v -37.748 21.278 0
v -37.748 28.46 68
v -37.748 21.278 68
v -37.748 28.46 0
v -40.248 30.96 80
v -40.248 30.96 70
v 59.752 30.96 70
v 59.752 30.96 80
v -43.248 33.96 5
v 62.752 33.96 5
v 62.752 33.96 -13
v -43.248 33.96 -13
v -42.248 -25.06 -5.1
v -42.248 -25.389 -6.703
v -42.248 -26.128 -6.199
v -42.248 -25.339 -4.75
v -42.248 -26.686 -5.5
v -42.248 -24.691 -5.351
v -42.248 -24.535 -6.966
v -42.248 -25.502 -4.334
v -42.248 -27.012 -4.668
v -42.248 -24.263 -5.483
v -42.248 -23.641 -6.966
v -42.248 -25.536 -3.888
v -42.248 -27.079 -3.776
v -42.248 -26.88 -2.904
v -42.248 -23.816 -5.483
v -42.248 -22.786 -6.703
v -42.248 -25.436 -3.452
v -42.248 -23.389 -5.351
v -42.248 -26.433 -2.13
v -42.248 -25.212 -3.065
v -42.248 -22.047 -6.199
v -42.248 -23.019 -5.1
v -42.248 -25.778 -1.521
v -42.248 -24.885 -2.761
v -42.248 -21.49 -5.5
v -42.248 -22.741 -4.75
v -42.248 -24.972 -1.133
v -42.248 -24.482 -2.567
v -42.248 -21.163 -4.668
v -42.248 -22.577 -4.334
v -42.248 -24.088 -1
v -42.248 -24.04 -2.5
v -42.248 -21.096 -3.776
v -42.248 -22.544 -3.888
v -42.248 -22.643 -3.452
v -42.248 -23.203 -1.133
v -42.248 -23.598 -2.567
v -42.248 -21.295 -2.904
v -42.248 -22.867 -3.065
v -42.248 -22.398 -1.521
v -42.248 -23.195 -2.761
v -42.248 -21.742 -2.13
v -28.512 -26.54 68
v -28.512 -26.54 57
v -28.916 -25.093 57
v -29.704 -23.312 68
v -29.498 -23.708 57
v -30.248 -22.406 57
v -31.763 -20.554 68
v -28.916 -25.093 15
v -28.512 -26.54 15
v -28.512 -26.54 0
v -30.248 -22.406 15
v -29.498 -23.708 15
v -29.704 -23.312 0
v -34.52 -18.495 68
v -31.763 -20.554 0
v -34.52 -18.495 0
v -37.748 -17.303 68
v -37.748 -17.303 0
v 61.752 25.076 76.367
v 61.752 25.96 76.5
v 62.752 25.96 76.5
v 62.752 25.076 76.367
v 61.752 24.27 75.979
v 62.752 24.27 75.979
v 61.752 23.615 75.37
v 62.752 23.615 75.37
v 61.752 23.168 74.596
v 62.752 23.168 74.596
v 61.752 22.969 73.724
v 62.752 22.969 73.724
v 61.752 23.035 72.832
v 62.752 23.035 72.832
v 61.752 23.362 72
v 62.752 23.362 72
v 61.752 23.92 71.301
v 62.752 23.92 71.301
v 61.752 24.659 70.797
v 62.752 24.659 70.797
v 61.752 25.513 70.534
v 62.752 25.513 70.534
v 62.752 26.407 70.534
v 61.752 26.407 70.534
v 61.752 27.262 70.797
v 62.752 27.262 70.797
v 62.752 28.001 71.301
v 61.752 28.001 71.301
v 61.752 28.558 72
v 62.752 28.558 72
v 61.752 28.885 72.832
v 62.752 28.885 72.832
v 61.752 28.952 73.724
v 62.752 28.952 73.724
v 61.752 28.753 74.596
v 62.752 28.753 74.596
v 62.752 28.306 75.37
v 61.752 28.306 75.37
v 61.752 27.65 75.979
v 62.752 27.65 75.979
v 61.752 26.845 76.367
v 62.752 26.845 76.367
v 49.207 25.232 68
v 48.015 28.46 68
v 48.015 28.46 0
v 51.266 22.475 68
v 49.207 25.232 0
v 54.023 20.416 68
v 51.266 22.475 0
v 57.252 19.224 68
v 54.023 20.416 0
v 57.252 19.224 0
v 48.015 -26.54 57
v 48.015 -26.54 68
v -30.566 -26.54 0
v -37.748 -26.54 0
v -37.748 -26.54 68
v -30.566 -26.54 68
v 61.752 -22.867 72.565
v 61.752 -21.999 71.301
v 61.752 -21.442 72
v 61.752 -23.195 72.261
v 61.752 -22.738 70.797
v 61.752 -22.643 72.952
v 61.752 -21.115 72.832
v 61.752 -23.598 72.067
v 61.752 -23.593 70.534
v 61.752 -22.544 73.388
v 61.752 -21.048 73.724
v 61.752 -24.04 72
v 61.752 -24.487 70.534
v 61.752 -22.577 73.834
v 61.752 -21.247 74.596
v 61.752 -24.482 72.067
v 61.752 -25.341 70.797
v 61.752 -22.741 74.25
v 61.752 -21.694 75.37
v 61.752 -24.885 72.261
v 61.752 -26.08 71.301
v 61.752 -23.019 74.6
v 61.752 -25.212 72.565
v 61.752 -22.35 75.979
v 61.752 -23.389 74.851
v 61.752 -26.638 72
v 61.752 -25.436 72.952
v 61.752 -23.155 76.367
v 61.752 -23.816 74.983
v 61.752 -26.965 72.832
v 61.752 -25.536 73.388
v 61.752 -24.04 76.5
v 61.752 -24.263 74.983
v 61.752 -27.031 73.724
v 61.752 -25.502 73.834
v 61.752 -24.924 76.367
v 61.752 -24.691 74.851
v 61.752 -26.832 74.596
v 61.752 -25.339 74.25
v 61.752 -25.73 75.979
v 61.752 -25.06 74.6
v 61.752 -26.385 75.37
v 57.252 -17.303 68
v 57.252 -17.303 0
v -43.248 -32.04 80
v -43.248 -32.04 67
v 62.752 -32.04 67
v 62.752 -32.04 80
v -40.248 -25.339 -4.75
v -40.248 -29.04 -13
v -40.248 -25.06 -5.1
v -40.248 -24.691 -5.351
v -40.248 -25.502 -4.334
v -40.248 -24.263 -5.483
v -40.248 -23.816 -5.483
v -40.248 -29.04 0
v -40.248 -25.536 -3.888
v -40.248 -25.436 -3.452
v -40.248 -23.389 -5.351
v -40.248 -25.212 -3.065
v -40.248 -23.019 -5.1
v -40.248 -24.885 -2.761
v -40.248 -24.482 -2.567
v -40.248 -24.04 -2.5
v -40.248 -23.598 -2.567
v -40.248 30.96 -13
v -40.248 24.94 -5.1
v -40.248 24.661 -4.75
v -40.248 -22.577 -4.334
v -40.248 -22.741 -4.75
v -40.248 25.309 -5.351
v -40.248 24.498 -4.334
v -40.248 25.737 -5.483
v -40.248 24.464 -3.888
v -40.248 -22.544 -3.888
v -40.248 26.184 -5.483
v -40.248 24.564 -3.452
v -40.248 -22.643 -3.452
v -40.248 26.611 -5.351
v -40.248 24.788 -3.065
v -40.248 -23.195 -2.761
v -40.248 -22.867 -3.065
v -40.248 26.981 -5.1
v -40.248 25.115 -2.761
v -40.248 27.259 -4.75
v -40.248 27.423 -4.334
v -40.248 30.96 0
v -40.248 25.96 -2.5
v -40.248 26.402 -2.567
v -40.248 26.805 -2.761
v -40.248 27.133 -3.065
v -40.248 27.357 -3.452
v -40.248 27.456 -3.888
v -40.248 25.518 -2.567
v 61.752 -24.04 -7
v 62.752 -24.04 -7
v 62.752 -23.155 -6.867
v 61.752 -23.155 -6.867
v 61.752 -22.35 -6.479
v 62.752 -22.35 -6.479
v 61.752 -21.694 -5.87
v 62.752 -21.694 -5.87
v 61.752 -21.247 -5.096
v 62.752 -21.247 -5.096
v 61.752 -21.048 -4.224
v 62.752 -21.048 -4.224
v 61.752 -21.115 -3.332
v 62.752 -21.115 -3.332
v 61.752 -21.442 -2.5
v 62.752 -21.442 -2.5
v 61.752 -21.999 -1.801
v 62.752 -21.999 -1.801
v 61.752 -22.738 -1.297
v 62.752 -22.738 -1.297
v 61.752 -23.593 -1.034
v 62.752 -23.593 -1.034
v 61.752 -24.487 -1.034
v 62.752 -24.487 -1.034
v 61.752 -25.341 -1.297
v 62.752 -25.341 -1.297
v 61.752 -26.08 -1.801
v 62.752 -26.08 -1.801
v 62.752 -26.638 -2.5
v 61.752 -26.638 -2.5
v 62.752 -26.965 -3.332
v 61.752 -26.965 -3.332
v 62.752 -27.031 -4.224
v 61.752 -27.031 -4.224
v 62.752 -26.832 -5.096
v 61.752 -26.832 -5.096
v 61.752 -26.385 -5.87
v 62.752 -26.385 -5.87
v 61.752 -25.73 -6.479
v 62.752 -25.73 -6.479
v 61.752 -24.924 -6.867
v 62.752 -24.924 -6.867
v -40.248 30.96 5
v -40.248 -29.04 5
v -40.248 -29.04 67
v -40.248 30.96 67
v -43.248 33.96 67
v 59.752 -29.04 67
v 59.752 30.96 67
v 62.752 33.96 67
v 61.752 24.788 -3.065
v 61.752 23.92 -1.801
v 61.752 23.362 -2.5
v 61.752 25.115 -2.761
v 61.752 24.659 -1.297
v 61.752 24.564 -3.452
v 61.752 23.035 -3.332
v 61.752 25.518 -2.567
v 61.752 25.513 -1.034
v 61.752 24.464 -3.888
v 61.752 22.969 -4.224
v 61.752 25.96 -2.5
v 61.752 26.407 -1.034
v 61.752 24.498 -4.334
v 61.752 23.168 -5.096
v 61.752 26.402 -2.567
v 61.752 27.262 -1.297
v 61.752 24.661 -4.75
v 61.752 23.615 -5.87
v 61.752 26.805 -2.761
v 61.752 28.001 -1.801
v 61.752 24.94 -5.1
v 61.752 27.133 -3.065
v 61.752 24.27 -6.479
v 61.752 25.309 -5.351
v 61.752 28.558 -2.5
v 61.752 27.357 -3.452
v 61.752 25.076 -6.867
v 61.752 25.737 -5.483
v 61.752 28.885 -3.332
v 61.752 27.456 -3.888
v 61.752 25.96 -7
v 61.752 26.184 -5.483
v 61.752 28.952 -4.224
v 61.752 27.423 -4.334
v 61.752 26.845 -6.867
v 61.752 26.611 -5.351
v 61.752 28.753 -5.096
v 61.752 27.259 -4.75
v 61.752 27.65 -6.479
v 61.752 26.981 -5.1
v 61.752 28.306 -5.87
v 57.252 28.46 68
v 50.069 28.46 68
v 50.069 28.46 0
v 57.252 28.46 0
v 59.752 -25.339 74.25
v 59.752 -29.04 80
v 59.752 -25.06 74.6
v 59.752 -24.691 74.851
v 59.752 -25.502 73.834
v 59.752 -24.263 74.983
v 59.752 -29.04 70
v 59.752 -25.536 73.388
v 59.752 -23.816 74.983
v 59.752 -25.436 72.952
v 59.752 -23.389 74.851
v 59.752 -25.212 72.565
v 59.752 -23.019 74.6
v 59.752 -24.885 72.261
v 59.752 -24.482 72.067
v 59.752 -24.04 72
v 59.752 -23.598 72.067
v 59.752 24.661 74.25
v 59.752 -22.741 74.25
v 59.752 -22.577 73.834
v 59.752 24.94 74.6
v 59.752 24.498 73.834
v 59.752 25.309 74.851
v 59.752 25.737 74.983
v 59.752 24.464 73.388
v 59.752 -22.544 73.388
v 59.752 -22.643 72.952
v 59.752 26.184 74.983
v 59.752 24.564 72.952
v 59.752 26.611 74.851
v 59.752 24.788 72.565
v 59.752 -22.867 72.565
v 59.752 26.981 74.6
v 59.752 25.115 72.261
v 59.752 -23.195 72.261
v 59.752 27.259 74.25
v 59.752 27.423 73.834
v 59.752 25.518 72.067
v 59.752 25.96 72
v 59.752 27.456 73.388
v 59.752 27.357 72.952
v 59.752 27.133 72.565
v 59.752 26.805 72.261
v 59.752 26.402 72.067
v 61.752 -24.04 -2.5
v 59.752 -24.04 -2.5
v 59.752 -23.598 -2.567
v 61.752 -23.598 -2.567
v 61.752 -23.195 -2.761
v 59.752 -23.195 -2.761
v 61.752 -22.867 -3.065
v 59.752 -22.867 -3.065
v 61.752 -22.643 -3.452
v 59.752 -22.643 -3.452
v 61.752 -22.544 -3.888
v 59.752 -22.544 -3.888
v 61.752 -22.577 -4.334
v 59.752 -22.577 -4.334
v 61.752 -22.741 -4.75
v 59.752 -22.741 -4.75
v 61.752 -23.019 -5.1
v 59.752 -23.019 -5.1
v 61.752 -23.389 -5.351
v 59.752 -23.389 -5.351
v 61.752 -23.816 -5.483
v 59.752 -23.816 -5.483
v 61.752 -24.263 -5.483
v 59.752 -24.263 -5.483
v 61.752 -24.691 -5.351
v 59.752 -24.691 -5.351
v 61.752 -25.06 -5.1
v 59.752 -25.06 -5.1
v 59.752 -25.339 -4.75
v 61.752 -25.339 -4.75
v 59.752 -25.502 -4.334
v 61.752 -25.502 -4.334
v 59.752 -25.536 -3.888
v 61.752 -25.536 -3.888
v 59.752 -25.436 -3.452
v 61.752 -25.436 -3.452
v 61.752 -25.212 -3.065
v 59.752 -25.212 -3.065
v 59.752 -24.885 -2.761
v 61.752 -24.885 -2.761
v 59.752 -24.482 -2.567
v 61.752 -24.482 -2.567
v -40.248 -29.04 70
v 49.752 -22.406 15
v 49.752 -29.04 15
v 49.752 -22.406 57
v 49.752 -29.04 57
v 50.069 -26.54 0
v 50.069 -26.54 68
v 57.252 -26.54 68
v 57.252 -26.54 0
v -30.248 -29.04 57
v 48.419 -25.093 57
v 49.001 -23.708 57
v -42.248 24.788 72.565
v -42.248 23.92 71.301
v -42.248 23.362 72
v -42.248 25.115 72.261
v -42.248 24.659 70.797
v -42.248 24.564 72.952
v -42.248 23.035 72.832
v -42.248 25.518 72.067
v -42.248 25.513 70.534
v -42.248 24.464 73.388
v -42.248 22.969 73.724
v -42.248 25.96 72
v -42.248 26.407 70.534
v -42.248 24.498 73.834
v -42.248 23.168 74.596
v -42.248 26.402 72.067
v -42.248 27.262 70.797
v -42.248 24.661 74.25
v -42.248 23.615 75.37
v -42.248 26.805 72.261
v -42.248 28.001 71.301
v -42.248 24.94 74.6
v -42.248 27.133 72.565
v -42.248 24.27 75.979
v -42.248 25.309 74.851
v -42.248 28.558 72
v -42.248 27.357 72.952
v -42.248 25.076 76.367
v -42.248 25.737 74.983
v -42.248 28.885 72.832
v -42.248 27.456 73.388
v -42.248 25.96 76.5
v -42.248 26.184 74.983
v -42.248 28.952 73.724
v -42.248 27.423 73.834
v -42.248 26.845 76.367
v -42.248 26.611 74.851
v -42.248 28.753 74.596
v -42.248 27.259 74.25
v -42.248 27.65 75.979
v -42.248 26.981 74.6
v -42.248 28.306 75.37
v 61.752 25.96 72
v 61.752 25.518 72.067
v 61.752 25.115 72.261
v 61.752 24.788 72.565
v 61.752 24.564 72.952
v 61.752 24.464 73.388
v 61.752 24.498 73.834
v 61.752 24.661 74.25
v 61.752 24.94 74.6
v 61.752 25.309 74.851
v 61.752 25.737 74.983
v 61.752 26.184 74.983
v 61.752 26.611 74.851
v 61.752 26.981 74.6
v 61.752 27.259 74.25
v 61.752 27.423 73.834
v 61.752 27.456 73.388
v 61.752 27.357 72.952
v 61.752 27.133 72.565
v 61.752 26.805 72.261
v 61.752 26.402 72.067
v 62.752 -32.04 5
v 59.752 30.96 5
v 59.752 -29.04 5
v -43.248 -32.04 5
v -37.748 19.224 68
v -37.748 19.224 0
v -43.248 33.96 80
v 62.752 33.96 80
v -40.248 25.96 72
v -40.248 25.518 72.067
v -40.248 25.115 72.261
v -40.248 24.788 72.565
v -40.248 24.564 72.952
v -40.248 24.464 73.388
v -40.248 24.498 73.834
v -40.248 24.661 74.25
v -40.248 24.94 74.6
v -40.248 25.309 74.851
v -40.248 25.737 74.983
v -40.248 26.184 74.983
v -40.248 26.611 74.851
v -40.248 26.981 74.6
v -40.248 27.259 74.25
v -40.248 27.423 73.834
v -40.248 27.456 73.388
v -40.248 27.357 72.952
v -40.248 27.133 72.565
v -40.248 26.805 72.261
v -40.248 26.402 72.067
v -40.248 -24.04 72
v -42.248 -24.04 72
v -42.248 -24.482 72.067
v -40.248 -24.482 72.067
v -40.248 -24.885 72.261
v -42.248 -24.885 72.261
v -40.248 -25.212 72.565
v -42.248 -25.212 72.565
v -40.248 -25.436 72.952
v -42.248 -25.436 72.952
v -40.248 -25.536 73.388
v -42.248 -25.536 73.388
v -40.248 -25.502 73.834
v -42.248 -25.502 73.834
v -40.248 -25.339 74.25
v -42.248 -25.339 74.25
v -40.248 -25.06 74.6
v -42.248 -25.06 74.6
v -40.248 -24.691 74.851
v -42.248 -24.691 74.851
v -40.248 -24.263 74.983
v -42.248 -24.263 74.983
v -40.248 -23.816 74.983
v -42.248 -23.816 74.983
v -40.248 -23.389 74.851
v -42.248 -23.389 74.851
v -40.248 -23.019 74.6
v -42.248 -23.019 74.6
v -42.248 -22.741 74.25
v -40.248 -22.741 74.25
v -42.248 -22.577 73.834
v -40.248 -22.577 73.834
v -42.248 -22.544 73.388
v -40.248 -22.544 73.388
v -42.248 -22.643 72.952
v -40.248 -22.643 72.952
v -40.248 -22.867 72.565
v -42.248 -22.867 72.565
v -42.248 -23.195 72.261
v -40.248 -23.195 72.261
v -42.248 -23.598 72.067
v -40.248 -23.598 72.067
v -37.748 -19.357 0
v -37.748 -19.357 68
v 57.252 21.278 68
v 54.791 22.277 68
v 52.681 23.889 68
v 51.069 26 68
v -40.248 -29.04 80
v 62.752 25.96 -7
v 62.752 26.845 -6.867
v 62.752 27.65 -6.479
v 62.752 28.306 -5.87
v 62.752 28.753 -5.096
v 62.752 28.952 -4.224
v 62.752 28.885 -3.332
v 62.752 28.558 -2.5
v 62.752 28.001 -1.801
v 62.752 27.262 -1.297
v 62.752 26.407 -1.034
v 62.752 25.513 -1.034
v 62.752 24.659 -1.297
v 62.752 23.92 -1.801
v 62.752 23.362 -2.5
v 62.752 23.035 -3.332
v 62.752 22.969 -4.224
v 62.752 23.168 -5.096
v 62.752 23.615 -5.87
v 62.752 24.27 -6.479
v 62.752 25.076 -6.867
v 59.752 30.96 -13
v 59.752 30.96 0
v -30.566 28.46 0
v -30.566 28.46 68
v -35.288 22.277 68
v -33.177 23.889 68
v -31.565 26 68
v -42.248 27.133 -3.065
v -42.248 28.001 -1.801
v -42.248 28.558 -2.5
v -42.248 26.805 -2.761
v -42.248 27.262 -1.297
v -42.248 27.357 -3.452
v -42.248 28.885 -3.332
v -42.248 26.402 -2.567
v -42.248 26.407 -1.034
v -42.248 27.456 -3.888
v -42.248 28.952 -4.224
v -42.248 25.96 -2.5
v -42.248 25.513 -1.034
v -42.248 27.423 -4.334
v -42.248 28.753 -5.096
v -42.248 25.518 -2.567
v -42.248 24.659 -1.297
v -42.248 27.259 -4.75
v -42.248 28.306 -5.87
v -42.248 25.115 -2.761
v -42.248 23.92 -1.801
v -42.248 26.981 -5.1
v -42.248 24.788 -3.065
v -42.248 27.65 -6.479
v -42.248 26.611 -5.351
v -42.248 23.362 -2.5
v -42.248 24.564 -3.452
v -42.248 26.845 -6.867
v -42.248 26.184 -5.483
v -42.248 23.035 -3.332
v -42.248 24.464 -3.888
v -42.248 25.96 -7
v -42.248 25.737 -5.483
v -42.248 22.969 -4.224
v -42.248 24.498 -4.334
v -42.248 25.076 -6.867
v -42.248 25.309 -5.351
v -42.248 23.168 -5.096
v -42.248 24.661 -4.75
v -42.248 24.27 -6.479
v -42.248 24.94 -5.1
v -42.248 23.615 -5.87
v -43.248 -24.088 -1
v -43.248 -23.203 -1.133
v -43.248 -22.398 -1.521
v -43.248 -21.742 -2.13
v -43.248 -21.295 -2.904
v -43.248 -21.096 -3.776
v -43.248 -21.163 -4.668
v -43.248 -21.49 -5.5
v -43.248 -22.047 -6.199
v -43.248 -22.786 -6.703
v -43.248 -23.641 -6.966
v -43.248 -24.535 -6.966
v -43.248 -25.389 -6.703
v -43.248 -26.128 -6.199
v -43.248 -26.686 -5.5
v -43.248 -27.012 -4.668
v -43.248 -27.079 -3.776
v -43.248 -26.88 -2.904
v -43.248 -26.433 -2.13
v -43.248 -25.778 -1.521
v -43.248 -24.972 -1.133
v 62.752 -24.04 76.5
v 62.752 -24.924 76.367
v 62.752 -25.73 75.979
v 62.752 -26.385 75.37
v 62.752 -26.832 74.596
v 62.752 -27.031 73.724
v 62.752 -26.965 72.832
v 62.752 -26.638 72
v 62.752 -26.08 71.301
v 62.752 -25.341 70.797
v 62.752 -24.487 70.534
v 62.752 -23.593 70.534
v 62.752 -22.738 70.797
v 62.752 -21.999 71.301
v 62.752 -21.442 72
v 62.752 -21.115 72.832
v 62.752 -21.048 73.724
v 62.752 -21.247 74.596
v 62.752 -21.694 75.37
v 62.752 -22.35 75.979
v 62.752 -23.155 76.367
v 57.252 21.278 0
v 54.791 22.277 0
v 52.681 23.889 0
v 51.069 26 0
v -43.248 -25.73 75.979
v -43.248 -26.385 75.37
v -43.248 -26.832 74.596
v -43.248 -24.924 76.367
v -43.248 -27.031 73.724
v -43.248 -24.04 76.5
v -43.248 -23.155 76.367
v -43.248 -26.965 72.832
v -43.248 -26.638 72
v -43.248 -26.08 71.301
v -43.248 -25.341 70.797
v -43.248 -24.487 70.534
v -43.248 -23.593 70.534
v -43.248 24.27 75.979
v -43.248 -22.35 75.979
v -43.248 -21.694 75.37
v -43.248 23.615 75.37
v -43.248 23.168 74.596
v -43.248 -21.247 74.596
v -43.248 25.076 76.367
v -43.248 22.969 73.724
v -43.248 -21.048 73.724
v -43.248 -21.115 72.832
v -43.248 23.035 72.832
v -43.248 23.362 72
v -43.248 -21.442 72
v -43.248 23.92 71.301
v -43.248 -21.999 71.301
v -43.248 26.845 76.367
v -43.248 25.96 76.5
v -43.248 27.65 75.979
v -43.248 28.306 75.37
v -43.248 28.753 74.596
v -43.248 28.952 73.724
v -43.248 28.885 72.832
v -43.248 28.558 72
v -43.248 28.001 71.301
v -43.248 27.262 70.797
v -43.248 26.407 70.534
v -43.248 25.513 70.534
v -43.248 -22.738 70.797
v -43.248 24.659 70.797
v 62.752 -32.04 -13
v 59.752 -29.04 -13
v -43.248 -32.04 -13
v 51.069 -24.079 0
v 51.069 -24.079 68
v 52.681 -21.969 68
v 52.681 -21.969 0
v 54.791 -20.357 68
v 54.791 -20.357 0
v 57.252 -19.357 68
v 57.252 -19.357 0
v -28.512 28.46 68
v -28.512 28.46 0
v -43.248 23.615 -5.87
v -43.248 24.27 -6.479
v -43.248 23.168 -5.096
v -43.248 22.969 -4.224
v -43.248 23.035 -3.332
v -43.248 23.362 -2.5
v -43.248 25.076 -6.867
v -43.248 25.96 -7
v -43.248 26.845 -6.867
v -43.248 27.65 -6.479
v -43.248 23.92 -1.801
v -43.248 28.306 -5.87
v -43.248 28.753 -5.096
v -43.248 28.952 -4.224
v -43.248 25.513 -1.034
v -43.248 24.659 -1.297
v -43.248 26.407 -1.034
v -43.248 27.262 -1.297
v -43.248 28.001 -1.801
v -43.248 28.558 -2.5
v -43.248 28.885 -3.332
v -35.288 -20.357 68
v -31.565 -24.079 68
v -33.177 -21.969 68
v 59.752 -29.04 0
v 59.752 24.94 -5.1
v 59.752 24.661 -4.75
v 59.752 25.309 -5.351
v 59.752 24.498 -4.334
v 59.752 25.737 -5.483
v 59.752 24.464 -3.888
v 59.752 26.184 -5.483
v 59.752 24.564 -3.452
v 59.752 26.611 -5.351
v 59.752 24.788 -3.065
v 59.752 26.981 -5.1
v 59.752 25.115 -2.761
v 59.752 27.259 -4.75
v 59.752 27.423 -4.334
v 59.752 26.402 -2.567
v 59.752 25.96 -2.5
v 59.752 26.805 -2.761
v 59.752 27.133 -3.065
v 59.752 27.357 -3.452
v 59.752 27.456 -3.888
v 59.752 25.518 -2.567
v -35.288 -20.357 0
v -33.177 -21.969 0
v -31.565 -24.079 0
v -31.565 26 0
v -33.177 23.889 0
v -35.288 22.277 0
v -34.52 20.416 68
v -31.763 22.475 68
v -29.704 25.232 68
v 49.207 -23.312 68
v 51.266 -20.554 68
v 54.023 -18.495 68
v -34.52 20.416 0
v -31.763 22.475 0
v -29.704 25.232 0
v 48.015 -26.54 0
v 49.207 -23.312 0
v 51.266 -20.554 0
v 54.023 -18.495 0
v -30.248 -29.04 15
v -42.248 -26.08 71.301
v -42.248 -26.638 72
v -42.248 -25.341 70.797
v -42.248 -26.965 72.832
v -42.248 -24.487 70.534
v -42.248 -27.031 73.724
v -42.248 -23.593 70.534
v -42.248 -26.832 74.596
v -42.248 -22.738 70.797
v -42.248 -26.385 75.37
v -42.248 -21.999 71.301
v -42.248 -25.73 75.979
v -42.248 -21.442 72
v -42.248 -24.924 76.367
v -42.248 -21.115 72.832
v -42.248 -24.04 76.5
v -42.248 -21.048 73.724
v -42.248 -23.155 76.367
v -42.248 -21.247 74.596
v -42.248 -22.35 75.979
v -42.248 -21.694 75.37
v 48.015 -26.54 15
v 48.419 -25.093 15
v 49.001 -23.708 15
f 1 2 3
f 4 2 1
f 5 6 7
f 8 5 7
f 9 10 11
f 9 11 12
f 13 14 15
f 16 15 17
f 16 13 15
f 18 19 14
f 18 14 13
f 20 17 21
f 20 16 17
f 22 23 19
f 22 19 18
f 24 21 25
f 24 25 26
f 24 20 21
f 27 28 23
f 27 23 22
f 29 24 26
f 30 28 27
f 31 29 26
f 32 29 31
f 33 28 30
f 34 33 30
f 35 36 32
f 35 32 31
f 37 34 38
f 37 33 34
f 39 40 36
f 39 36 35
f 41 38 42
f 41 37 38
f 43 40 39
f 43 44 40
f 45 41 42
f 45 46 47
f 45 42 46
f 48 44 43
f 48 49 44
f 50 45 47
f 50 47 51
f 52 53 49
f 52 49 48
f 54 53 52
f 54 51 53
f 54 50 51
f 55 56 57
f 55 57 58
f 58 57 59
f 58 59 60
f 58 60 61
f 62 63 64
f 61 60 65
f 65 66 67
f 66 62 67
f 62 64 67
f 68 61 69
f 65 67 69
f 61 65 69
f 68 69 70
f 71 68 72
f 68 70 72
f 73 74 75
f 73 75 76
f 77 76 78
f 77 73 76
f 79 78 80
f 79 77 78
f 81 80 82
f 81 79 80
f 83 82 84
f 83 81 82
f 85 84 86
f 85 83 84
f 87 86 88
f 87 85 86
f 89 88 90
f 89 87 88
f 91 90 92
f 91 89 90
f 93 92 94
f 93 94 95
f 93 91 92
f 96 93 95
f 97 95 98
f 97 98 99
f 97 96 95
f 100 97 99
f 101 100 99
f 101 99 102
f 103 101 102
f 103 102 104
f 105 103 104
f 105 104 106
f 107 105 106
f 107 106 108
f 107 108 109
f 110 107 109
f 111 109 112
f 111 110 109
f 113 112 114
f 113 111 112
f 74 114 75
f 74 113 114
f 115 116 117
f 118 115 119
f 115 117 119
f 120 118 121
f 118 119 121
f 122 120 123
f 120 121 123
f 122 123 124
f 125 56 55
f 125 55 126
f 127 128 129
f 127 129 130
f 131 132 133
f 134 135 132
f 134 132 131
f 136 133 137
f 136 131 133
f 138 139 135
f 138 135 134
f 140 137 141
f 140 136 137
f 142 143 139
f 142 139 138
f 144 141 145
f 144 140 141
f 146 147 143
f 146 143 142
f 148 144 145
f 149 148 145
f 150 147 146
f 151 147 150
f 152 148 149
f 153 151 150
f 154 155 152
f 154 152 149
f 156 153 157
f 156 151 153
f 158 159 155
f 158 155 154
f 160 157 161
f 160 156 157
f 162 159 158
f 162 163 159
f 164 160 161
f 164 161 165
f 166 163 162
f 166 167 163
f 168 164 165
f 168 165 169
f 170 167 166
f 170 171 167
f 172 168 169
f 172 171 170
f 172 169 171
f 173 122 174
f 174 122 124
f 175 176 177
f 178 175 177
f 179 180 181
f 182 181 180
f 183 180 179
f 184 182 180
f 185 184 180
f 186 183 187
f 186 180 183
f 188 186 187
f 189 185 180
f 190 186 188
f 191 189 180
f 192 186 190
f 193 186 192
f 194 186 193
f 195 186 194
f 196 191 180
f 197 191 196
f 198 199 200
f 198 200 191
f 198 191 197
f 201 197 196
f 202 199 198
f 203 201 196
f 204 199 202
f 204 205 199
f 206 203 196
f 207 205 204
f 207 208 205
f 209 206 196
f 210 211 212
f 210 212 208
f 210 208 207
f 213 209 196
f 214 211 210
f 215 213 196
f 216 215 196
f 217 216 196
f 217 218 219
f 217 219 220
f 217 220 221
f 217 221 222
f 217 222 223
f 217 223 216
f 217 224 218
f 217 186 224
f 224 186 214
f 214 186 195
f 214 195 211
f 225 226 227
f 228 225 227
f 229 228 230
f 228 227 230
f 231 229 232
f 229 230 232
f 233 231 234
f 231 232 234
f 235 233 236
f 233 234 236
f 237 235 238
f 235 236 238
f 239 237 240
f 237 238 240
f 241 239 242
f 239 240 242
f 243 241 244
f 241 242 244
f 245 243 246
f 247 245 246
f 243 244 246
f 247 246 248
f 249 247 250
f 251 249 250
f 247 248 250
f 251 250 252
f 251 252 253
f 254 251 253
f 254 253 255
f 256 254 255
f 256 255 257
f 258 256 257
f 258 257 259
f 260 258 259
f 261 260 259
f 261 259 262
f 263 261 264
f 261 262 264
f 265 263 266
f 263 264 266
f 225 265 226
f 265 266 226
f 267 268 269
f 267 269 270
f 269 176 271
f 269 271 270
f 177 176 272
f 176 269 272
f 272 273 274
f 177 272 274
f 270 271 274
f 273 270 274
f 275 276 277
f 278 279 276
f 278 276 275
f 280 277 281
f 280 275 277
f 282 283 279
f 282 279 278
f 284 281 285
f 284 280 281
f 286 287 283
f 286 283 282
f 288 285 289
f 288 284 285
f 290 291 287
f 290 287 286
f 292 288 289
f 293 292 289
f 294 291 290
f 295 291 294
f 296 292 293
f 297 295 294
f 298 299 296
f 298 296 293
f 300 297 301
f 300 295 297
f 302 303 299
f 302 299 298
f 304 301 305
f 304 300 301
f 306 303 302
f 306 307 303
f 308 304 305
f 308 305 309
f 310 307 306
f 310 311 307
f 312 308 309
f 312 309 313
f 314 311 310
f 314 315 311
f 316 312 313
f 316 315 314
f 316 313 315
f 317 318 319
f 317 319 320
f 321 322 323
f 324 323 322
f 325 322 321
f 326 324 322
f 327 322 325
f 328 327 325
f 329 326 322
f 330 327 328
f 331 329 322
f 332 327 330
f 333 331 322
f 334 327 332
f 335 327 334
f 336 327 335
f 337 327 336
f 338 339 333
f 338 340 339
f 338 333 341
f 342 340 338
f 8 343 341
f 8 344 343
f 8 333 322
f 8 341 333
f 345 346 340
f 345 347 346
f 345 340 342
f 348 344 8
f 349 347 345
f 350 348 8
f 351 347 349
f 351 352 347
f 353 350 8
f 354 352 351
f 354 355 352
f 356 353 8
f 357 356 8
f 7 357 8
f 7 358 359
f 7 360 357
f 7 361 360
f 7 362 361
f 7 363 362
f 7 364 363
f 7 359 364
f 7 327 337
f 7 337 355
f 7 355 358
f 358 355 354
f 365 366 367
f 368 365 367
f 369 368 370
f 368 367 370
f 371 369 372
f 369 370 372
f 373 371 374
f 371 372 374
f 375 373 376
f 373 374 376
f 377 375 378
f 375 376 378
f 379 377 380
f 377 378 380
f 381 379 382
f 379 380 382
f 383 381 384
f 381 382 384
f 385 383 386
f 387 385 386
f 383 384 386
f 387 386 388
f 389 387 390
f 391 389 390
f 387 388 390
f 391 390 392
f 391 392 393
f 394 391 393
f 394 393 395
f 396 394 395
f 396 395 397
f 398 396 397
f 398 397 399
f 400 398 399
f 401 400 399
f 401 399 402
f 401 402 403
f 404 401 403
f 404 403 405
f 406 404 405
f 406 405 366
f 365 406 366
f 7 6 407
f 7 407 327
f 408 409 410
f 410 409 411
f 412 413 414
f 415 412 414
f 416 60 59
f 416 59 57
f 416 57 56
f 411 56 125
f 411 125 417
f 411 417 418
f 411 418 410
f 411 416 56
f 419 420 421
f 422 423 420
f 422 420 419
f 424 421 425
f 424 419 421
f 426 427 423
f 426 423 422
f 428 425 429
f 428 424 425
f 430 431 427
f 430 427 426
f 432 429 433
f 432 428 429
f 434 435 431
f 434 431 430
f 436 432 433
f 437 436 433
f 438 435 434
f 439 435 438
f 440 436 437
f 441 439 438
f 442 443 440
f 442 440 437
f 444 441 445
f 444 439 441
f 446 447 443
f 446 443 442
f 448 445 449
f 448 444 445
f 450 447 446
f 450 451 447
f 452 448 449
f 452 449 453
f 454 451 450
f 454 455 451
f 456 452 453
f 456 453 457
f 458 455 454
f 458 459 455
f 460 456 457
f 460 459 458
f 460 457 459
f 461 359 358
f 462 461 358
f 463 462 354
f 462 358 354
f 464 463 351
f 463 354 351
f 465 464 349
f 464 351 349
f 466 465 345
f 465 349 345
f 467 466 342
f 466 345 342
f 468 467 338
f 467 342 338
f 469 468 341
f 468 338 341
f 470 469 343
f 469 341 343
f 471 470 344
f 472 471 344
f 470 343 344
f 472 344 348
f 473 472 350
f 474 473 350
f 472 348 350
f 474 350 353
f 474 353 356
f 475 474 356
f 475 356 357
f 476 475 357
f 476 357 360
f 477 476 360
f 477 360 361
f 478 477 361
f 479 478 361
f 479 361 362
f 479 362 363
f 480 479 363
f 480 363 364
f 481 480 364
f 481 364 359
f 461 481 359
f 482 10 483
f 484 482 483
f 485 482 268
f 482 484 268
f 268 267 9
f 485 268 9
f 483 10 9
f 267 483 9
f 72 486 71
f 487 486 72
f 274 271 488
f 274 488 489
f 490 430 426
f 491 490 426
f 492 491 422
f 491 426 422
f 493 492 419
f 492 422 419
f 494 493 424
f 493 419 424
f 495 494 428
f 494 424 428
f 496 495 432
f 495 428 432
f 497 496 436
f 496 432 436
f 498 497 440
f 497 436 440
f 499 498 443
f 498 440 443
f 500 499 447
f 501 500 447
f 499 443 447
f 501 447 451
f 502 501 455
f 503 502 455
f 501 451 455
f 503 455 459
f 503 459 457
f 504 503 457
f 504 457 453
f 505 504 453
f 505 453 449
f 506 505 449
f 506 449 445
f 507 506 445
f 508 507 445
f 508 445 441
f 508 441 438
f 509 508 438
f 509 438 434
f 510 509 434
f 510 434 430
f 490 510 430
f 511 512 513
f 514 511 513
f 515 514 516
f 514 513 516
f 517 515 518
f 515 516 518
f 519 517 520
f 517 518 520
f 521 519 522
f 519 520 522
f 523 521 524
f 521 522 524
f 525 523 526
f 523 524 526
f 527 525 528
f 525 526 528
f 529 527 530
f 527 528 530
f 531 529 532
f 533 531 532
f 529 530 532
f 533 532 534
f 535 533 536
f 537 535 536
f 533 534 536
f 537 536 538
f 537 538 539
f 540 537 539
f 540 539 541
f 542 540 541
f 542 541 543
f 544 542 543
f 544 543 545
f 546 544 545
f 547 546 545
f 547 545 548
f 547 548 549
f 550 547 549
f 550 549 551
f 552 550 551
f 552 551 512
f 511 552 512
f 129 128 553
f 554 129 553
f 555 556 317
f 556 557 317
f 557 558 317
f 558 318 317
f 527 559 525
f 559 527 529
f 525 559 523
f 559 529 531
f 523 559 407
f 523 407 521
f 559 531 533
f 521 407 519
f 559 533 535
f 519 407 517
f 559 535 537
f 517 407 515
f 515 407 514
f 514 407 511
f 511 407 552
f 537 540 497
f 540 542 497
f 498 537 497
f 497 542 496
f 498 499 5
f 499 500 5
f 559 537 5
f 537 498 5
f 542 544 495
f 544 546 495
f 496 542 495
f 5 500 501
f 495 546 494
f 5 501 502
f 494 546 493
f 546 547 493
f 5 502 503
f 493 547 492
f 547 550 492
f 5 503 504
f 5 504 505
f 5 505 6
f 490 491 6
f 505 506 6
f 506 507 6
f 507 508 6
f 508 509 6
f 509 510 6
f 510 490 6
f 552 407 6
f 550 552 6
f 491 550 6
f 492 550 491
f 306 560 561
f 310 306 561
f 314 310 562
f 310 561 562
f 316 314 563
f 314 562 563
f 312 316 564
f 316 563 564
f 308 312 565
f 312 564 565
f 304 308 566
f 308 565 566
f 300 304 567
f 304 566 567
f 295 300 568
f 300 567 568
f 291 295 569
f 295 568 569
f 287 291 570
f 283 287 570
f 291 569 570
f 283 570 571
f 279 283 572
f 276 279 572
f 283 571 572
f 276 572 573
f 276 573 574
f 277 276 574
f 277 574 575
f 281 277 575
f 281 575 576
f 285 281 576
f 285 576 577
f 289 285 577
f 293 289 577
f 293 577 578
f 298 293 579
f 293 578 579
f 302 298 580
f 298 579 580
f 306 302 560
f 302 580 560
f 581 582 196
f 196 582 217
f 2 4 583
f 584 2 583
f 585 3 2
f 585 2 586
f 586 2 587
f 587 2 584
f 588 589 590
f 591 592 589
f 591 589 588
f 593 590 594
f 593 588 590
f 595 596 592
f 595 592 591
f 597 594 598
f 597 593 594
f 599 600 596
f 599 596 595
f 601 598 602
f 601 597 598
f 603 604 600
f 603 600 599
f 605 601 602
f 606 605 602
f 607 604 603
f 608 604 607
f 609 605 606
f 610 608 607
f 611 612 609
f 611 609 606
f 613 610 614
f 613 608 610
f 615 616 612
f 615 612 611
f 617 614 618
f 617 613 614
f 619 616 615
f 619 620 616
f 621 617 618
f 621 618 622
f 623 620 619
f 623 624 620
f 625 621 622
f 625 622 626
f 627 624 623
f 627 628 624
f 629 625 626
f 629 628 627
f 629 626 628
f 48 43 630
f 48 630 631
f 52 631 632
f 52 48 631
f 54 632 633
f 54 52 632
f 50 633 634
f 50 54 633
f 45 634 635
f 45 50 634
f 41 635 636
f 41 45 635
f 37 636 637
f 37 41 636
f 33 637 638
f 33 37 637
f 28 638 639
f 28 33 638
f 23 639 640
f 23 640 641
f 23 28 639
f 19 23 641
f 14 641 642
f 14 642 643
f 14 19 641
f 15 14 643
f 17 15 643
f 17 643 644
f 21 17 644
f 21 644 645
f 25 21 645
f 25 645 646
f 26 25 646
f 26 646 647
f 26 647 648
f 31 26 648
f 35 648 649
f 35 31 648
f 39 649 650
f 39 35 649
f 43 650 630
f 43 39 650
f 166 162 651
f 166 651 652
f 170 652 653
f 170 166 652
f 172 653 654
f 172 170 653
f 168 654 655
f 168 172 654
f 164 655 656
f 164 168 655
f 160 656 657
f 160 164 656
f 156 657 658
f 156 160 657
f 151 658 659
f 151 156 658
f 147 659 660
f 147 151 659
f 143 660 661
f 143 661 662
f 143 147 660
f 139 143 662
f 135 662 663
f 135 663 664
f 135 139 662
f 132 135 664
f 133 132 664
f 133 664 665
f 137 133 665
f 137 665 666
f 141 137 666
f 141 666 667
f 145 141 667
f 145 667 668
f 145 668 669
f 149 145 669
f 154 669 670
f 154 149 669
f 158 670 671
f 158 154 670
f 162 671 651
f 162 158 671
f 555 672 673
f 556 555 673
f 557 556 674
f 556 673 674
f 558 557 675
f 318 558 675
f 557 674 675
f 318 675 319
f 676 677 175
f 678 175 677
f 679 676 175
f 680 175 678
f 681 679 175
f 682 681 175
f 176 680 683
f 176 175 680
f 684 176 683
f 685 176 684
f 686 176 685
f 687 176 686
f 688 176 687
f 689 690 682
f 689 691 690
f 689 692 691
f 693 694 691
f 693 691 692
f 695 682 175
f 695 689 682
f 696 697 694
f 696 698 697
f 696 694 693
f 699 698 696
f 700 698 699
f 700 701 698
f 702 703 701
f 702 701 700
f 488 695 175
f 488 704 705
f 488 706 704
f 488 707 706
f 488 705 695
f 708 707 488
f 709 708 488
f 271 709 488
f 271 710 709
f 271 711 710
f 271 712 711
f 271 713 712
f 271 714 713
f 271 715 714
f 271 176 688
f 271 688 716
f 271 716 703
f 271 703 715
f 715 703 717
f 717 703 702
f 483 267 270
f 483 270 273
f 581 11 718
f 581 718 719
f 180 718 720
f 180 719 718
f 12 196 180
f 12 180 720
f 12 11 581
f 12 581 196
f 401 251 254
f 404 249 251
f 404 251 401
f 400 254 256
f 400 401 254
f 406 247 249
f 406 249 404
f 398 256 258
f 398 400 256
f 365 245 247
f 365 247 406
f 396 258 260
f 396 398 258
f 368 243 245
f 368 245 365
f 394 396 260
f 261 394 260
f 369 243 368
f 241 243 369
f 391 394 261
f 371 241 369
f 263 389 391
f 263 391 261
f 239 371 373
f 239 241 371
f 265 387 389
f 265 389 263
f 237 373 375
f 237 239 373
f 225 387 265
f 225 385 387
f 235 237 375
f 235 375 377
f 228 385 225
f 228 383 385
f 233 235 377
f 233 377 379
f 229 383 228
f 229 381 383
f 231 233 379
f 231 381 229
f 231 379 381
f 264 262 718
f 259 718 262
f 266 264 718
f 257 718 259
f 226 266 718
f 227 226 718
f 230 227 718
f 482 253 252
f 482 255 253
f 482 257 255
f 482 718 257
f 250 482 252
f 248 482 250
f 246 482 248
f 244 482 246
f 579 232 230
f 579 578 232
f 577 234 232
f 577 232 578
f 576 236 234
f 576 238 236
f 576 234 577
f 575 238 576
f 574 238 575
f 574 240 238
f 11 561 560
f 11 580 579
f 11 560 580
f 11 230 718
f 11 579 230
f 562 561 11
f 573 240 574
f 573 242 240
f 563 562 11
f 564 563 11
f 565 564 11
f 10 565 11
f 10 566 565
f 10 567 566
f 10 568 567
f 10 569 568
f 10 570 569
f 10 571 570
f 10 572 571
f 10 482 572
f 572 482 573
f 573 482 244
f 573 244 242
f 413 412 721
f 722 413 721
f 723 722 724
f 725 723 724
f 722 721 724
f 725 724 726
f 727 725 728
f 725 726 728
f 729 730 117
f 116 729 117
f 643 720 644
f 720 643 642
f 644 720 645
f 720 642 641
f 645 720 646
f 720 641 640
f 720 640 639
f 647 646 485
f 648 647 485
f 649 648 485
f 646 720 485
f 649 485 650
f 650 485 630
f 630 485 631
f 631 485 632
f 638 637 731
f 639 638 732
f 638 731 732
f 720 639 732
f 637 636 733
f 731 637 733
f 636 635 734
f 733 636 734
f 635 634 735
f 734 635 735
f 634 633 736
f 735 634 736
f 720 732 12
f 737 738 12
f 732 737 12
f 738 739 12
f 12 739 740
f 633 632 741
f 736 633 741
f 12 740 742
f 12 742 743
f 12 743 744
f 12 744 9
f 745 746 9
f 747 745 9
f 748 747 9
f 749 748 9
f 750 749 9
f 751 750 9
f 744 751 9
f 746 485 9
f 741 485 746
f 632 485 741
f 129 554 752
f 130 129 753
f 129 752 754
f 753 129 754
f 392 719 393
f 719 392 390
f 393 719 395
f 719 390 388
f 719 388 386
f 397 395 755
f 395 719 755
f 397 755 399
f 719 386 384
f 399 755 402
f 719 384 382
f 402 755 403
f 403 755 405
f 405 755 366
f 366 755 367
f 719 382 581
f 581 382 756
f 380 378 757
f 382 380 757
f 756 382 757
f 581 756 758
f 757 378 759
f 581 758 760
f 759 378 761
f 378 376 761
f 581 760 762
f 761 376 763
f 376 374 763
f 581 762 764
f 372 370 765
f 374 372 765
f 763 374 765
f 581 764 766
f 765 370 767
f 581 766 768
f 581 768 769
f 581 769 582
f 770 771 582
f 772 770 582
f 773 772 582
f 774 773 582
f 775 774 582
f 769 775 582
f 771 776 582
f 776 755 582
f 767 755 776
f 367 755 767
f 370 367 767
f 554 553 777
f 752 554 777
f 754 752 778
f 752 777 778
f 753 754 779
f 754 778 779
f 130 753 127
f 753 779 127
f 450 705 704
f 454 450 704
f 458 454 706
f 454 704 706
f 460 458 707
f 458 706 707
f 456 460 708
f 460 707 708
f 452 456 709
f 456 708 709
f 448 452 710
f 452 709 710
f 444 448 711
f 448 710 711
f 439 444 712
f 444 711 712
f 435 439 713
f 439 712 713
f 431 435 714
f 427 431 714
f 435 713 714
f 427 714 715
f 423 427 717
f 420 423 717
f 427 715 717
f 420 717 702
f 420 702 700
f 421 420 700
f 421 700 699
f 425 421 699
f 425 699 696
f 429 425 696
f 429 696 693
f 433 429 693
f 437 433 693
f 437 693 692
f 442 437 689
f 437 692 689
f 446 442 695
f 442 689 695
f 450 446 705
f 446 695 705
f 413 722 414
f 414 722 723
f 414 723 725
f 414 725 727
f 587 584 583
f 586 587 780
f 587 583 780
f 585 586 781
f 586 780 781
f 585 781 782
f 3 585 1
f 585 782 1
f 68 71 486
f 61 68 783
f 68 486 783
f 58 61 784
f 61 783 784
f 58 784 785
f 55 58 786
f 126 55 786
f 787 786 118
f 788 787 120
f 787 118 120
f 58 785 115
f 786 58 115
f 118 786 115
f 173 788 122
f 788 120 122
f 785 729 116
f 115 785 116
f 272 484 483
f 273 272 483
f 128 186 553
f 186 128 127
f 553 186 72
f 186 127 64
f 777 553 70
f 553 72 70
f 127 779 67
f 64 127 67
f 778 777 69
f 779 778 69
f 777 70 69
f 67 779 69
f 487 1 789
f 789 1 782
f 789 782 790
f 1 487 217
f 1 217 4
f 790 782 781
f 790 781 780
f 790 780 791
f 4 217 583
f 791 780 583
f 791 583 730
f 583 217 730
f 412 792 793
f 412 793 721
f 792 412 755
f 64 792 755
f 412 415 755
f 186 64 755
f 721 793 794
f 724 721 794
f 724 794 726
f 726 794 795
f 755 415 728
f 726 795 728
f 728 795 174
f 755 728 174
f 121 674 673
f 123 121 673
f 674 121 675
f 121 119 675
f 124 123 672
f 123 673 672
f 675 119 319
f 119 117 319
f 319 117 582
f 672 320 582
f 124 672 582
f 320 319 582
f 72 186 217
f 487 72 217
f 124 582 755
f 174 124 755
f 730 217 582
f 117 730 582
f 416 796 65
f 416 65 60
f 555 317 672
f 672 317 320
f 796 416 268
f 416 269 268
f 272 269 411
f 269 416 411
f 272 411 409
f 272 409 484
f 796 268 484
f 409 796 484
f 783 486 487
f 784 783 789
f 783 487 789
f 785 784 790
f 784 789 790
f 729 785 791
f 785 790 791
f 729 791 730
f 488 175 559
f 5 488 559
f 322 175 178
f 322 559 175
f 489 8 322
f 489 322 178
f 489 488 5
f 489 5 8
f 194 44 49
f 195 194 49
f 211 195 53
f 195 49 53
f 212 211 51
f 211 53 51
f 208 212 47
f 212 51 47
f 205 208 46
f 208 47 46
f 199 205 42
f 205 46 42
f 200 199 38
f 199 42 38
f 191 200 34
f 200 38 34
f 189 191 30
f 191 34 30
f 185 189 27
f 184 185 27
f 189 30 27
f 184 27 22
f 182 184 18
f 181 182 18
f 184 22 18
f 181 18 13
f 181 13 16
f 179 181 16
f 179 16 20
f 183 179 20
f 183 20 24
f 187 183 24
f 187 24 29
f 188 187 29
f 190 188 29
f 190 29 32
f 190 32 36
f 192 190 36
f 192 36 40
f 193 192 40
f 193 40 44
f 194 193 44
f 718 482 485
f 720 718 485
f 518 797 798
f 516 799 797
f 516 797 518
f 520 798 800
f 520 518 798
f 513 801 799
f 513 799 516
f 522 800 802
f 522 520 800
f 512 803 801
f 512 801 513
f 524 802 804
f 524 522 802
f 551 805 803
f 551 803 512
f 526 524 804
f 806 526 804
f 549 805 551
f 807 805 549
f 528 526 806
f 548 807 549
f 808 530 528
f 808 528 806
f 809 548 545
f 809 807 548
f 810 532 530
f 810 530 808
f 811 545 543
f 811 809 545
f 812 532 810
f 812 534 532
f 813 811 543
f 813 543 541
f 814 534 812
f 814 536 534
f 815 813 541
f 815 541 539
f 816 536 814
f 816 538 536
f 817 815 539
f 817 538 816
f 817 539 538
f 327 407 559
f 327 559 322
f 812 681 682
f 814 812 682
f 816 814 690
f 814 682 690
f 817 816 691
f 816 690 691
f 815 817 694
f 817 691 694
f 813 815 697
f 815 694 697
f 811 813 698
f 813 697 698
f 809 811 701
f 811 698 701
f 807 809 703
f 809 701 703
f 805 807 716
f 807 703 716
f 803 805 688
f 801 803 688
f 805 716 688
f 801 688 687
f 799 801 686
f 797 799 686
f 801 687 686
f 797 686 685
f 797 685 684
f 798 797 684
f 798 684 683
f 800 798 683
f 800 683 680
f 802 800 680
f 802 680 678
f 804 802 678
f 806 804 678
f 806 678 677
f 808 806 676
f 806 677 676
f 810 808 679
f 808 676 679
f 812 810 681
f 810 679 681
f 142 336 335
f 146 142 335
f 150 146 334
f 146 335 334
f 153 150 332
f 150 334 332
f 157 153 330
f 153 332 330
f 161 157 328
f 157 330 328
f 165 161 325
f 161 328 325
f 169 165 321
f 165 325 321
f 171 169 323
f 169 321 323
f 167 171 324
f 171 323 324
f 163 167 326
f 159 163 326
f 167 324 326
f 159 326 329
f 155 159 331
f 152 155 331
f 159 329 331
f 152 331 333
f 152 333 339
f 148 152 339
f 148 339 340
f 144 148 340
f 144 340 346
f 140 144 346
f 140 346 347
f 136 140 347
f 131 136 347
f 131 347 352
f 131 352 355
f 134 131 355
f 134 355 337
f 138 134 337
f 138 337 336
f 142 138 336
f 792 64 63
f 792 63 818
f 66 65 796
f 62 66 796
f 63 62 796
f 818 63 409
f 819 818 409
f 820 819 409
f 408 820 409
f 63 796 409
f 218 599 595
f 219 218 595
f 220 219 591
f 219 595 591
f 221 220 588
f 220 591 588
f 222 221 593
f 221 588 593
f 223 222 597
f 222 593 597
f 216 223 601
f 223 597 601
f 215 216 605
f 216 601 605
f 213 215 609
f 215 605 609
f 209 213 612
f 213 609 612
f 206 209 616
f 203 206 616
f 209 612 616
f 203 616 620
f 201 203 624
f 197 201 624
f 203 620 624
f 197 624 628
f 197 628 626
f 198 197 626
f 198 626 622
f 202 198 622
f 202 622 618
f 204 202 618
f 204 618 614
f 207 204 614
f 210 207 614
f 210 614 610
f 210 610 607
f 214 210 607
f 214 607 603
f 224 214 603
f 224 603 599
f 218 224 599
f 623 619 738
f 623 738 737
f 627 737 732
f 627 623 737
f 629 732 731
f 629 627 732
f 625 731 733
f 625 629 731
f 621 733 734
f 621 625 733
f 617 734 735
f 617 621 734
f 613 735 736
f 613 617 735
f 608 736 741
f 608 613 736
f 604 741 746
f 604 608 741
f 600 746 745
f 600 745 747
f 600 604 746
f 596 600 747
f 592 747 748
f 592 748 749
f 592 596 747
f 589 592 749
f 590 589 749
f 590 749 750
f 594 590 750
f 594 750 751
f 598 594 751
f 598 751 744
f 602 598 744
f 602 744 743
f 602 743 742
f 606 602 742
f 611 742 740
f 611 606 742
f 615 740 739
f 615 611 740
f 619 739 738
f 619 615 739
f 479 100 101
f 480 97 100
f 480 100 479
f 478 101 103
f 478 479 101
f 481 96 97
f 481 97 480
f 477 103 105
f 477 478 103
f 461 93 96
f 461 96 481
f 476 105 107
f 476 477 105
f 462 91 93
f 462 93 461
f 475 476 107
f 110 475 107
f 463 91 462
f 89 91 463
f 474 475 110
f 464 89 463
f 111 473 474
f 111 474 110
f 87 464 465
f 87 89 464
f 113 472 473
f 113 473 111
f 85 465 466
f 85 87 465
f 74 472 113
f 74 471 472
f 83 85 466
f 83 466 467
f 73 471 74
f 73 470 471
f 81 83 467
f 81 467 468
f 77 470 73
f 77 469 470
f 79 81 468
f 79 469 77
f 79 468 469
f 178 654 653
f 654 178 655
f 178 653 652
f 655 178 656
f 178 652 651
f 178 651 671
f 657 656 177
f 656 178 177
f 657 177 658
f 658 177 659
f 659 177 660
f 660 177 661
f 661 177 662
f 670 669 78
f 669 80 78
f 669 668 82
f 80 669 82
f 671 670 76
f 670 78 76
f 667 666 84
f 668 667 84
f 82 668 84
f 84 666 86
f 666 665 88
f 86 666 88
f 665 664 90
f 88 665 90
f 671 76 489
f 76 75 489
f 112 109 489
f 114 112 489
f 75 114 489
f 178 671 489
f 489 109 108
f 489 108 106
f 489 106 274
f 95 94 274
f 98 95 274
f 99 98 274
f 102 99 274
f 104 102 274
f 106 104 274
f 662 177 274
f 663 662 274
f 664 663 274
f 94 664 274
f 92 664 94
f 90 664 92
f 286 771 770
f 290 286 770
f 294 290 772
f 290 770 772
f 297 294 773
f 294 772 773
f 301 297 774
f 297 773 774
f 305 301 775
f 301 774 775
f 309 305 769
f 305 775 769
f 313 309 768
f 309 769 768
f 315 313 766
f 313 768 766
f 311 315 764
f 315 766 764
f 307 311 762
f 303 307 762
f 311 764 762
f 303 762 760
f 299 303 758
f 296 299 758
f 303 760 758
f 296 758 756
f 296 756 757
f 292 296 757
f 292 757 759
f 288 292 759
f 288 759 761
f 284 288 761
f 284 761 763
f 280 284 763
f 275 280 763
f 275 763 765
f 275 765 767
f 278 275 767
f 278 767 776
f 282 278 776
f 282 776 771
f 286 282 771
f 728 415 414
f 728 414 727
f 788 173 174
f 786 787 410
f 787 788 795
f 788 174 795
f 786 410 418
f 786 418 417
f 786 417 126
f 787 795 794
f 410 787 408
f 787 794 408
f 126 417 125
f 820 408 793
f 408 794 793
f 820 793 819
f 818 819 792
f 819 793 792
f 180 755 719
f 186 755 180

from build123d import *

# Parameters (mm, degrees)
SKETCH1_W                = 100
SKETCH1_H                = 60
BOSS_EXTRUDE1_DEPTH      = 150
SKETCH2_W                = 95
SKETCH2_H                = 15
CUT_EXTRUDE1_DEPTH       = 20
BOSS_EXTRUDE2_DEPTH      = 13
BOSS_EXTRUDE2_DEPTH_BACK = 5
SKETCH3_W                = 106
SKETCH3_H                = 66
SKETCH3_W_2              = 100
SKETCH3_H_2              = 60
SKETCH4_R                = 1.5
CUT_EXTRUDE2_DEPTH       = 120
SKETCH5_R                = 3
CUT_EXTRUDE3_DEPTH       = 1
CUT_EXTRUDE4_START       = -1
SKETCH6_R                = 3
CUT_EXTRUDE4_DEPTH       = 1
SKETCH8_W                = 125.879436885
SKETCH8_H                = 80.445742456
CUT_EXTRUDE6_DEPTH       = 80
BOSS_EXTRUDE3_DEPTH      = 10
BOSS_EXTRUDE3_DEPTH_BACK = 3
SKETCH9_W                = 106
SKETCH9_H                = 66
SKETCH9_W_2              = 100
SKETCH9_H_2              = 60
SKETCH10_R               = 1.5
CUT_EXTRUDE7_DEPTH       = 117
SKETCH10_3_R             = 3
CUT_EXTRUDE8_DEPTH       = 1
CUT_EXTRUDE9_START       = -1
SKETCH11_R               = 3
CUT_EXTRUDE9_DEPTH       = 1
SKETCH12_W               = 100
SKETCH12_H               = 60
BOSS_EXTRUDE4_DEPTH      = 2
SKETCH13_W               = 80
SKETCH13_H               = 42
CUT_EXTRUDE10_DEPTH      = 10


with BuildPart() as part:
    # Sketch1 → Boss-Extrude1 (new body)
    with BuildSketch(Plane.XY):
        with Locations((9.751655629, 0.960264901)):
            Rectangle(SKETCH1_W, SKETCH1_H)
        with BuildLine():
            Line((-37.748344371, 21.277806535), (-37.748344371, 28.460264901))
            Line((-37.748344371, 28.460264901), (-30.565886005, 28.460264901))
            ThreePointArc((-30.565886005, 28.460264901), (-33.177276559, 23.889197089), (-37.748344371, 21.277806535))
        make_face(mode=Mode.SUBTRACT)
        with BuildLine():
            Line((-37.748344371, -17.303040505), (-37.748344371, 19.223570306))
            ThreePointArc((-37.748344371, 19.223570306), (-31.763062997, 22.474983526), (-28.511649777, 28.460264901))
            Line((-28.511649777, 28.460264901), (48.014961035, 28.460264901))
            ThreePointArc((48.014961035, 28.460264901), (51.266374255, 22.474983526), (57.251655629, 19.223570306))
            Line((57.251655629, 19.223570306), (57.251655629, -17.303040505))
            ThreePointArc((57.251655629, -17.303040505), (51.266374255, -20.554453725), (48.014961035, -26.539735099))
            Line((48.014961035, -26.539735099), (-28.511649777, -26.539735099))
            ThreePointArc((-28.511649777, -26.539735099), (-31.763062997, -20.554453725), (-37.748344371, -17.303040505))
        make_face(mode=Mode.SUBTRACT)
        with BuildLine():
            Line((-37.748344371, -26.539735099), (-37.748344371, -19.357276734))
            ThreePointArc((-37.748344371, -19.357276734), (-33.177276559, -21.968667287), (-30.565886005, -26.539735099))
            Line((-30.565886005, -26.539735099), (-37.748344371, -26.539735099))
        make_face(mode=Mode.SUBTRACT)
        with BuildLine():
            Line((57.251655629, -26.539735099), (50.069197264, -26.539735099))
            ThreePointArc((50.069197264, -26.539735099), (52.680587817, -21.968667287), (57.251655629, -19.357276734))
            Line((57.251655629, -19.357276734), (57.251655629, -26.539735099))
        make_face(mode=Mode.SUBTRACT)
        with BuildLine():
            Line((57.251655629, 28.460264901), (57.251655629, 21.277806535))
            ThreePointArc((57.251655629, 21.277806535), (52.680587817, 23.889197089), (50.069197264, 28.460264901))
            Line((50.069197264, 28.460264901), (57.251655629, 28.460264901))
        make_face(mode=Mode.SUBTRACT)
    extrude(amount=BOSS_EXTRUDE1_DEPTH)

    # Sketch2 → Cut-Extrude1 (cut)
    with BuildSketch(Plane(origin=(0, 30.960264901, 0), x_dir=(1, 0, 0), z_dir=(0, 1, 0))):
        with Locations((9.751655629, -142.5)):
            Rectangle(SKETCH2_W, SKETCH2_H)
    extrude(amount=-CUT_EXTRUDE1_DEPTH, mode=Mode.SUBTRACT)

    # Sketch3 → Boss-Extrude2 (add, two sides: drawn at the far end of the back side and taken through both)
    with BuildSketch(Plane(origin=(0, 0, 0), x_dir=(-1, 0, 0), z_dir=(0, 0, -1)).offset(-BOSS_EXTRUDE2_DEPTH_BACK)):
        with Locations((-9.751655629, 0.960264901)):
            Rectangle(SKETCH3_W, SKETCH3_H)
        with Locations((-9.751655629, 0.960264901)):
            Rectangle(SKETCH3_W_2, SKETCH3_H_2, mode=Mode.SUBTRACT)
    extrude(amount=BOSS_EXTRUDE2_DEPTH + BOSS_EXTRUDE2_DEPTH_BACK)

    # Sketch4 → Cut-Extrude2 (cut)
    with BuildSketch(Plane.ZY.offset(43.248344371)):
        with Locations((-4, -24.039735099)):
            Circle(SKETCH4_R)
        with Locations((-4, 25.960264901)):
            Circle(SKETCH4_R)
    extrude(amount=-CUT_EXTRUDE2_DEPTH, mode=Mode.SUBTRACT)

    # Sketch5 → Cut-Extrude3 (cut)
    with BuildSketch(Plane(origin=(62.751655629, 0, 0), x_dir=(0, 0, -1), z_dir=(1, 0, 0))):
        with Locations((4, -24.039735099)):
            Circle(SKETCH5_R)
        with Locations((4, 25.960264901)):
            Circle(SKETCH5_R)
    extrude(amount=-CUT_EXTRUDE3_DEPTH, mode=Mode.SUBTRACT)

    # Sketch6 → Cut-Extrude4 (cut)
    with BuildSketch(Plane.ZY.offset(43.248344371).offset(CUT_EXTRUDE4_START)):
        with Locations((-4, 25.960264901)):
            Circle(SKETCH6_R)
        with Locations((-4, -24.087684502)):
            Circle(SKETCH6_R)
    extrude(amount=CUT_EXTRUDE4_DEPTH, mode=Mode.SUBTRACT)

    # Sketch8 → Cut-Extrude6 (cut)
    with BuildSketch(Plane.XY.offset(150)):
        with Locations((7.819552644, 0.433327723)):
            Rectangle(SKETCH8_W, SKETCH8_H)
    extrude(amount=-CUT_EXTRUDE6_DEPTH, mode=Mode.SUBTRACT)

    # Sketch9 → Boss-Extrude3 (add, two sides: drawn at the far end of the back side and taken through both)
    with BuildSketch(Plane.XY.offset(70).offset(-BOSS_EXTRUDE3_DEPTH_BACK)):
        with Locations((9.751655629, 0.960264901)):
            Rectangle(SKETCH9_W, SKETCH9_H)
        with Locations((9.751655629, 0.960264901)):
            Rectangle(SKETCH9_W_2, SKETCH9_H_2, mode=Mode.SUBTRACT)
    extrude(amount=BOSS_EXTRUDE3_DEPTH + BOSS_EXTRUDE3_DEPTH_BACK)

    # Sketch10 → Cut-Extrude7 (cut)
    with BuildSketch(Plane.ZY.offset(43.248344371)):
        with Locations((73.5, 25.960264901)):
            Circle(SKETCH10_R)
        with Locations((73.5, -24.039735099)):
            Circle(SKETCH10_R)
    extrude(amount=-CUT_EXTRUDE7_DEPTH, mode=Mode.SUBTRACT)

    # Sketch10<3> → Cut-Extrude8 (cut)
    with BuildSketch(Plane.ZY.offset(43.248344371)):
        with Locations((73.5, 25.960264901)):
            Circle(SKETCH10_3_R)
        with Locations((73.5, -24.039735099)):
            Circle(SKETCH10_3_R)
    extrude(amount=-CUT_EXTRUDE8_DEPTH, mode=Mode.SUBTRACT)

    # Sketch11 → Cut-Extrude9 (cut)
    with BuildSketch(Plane(origin=(62.751655629, 0, 0), x_dir=(0, 0, -1), z_dir=(1, 0, 0)).offset(CUT_EXTRUDE9_START)):
        with Locations((-73.5, -24.039735099)):
            Circle(SKETCH11_R)
        with Locations((-73.5, 25.960264901)):
            Circle(SKETCH11_R)
    extrude(amount=CUT_EXTRUDE9_DEPTH, mode=Mode.SUBTRACT)

    # Sketch12 → Boss-Extrude4 (add)
    with BuildSketch(Plane.XY.offset(70)):
        with Locations((9.751655629, 0.960264901)):
            Rectangle(SKETCH12_W, SKETCH12_H)
    extrude(amount=-BOSS_EXTRUDE4_DEPTH)

    # Sketch13 → Cut-Extrude10 (cut)
    with BuildSketch(Plane.XZ.offset(29.039735099)):
        with Locations((9.751655629, 36)):
            Rectangle(SKETCH13_W, SKETCH13_H)
    extrude(amount=-CUT_EXTRUDE10_DEPTH, mode=Mode.SUBTRACT)


solid = part.part
